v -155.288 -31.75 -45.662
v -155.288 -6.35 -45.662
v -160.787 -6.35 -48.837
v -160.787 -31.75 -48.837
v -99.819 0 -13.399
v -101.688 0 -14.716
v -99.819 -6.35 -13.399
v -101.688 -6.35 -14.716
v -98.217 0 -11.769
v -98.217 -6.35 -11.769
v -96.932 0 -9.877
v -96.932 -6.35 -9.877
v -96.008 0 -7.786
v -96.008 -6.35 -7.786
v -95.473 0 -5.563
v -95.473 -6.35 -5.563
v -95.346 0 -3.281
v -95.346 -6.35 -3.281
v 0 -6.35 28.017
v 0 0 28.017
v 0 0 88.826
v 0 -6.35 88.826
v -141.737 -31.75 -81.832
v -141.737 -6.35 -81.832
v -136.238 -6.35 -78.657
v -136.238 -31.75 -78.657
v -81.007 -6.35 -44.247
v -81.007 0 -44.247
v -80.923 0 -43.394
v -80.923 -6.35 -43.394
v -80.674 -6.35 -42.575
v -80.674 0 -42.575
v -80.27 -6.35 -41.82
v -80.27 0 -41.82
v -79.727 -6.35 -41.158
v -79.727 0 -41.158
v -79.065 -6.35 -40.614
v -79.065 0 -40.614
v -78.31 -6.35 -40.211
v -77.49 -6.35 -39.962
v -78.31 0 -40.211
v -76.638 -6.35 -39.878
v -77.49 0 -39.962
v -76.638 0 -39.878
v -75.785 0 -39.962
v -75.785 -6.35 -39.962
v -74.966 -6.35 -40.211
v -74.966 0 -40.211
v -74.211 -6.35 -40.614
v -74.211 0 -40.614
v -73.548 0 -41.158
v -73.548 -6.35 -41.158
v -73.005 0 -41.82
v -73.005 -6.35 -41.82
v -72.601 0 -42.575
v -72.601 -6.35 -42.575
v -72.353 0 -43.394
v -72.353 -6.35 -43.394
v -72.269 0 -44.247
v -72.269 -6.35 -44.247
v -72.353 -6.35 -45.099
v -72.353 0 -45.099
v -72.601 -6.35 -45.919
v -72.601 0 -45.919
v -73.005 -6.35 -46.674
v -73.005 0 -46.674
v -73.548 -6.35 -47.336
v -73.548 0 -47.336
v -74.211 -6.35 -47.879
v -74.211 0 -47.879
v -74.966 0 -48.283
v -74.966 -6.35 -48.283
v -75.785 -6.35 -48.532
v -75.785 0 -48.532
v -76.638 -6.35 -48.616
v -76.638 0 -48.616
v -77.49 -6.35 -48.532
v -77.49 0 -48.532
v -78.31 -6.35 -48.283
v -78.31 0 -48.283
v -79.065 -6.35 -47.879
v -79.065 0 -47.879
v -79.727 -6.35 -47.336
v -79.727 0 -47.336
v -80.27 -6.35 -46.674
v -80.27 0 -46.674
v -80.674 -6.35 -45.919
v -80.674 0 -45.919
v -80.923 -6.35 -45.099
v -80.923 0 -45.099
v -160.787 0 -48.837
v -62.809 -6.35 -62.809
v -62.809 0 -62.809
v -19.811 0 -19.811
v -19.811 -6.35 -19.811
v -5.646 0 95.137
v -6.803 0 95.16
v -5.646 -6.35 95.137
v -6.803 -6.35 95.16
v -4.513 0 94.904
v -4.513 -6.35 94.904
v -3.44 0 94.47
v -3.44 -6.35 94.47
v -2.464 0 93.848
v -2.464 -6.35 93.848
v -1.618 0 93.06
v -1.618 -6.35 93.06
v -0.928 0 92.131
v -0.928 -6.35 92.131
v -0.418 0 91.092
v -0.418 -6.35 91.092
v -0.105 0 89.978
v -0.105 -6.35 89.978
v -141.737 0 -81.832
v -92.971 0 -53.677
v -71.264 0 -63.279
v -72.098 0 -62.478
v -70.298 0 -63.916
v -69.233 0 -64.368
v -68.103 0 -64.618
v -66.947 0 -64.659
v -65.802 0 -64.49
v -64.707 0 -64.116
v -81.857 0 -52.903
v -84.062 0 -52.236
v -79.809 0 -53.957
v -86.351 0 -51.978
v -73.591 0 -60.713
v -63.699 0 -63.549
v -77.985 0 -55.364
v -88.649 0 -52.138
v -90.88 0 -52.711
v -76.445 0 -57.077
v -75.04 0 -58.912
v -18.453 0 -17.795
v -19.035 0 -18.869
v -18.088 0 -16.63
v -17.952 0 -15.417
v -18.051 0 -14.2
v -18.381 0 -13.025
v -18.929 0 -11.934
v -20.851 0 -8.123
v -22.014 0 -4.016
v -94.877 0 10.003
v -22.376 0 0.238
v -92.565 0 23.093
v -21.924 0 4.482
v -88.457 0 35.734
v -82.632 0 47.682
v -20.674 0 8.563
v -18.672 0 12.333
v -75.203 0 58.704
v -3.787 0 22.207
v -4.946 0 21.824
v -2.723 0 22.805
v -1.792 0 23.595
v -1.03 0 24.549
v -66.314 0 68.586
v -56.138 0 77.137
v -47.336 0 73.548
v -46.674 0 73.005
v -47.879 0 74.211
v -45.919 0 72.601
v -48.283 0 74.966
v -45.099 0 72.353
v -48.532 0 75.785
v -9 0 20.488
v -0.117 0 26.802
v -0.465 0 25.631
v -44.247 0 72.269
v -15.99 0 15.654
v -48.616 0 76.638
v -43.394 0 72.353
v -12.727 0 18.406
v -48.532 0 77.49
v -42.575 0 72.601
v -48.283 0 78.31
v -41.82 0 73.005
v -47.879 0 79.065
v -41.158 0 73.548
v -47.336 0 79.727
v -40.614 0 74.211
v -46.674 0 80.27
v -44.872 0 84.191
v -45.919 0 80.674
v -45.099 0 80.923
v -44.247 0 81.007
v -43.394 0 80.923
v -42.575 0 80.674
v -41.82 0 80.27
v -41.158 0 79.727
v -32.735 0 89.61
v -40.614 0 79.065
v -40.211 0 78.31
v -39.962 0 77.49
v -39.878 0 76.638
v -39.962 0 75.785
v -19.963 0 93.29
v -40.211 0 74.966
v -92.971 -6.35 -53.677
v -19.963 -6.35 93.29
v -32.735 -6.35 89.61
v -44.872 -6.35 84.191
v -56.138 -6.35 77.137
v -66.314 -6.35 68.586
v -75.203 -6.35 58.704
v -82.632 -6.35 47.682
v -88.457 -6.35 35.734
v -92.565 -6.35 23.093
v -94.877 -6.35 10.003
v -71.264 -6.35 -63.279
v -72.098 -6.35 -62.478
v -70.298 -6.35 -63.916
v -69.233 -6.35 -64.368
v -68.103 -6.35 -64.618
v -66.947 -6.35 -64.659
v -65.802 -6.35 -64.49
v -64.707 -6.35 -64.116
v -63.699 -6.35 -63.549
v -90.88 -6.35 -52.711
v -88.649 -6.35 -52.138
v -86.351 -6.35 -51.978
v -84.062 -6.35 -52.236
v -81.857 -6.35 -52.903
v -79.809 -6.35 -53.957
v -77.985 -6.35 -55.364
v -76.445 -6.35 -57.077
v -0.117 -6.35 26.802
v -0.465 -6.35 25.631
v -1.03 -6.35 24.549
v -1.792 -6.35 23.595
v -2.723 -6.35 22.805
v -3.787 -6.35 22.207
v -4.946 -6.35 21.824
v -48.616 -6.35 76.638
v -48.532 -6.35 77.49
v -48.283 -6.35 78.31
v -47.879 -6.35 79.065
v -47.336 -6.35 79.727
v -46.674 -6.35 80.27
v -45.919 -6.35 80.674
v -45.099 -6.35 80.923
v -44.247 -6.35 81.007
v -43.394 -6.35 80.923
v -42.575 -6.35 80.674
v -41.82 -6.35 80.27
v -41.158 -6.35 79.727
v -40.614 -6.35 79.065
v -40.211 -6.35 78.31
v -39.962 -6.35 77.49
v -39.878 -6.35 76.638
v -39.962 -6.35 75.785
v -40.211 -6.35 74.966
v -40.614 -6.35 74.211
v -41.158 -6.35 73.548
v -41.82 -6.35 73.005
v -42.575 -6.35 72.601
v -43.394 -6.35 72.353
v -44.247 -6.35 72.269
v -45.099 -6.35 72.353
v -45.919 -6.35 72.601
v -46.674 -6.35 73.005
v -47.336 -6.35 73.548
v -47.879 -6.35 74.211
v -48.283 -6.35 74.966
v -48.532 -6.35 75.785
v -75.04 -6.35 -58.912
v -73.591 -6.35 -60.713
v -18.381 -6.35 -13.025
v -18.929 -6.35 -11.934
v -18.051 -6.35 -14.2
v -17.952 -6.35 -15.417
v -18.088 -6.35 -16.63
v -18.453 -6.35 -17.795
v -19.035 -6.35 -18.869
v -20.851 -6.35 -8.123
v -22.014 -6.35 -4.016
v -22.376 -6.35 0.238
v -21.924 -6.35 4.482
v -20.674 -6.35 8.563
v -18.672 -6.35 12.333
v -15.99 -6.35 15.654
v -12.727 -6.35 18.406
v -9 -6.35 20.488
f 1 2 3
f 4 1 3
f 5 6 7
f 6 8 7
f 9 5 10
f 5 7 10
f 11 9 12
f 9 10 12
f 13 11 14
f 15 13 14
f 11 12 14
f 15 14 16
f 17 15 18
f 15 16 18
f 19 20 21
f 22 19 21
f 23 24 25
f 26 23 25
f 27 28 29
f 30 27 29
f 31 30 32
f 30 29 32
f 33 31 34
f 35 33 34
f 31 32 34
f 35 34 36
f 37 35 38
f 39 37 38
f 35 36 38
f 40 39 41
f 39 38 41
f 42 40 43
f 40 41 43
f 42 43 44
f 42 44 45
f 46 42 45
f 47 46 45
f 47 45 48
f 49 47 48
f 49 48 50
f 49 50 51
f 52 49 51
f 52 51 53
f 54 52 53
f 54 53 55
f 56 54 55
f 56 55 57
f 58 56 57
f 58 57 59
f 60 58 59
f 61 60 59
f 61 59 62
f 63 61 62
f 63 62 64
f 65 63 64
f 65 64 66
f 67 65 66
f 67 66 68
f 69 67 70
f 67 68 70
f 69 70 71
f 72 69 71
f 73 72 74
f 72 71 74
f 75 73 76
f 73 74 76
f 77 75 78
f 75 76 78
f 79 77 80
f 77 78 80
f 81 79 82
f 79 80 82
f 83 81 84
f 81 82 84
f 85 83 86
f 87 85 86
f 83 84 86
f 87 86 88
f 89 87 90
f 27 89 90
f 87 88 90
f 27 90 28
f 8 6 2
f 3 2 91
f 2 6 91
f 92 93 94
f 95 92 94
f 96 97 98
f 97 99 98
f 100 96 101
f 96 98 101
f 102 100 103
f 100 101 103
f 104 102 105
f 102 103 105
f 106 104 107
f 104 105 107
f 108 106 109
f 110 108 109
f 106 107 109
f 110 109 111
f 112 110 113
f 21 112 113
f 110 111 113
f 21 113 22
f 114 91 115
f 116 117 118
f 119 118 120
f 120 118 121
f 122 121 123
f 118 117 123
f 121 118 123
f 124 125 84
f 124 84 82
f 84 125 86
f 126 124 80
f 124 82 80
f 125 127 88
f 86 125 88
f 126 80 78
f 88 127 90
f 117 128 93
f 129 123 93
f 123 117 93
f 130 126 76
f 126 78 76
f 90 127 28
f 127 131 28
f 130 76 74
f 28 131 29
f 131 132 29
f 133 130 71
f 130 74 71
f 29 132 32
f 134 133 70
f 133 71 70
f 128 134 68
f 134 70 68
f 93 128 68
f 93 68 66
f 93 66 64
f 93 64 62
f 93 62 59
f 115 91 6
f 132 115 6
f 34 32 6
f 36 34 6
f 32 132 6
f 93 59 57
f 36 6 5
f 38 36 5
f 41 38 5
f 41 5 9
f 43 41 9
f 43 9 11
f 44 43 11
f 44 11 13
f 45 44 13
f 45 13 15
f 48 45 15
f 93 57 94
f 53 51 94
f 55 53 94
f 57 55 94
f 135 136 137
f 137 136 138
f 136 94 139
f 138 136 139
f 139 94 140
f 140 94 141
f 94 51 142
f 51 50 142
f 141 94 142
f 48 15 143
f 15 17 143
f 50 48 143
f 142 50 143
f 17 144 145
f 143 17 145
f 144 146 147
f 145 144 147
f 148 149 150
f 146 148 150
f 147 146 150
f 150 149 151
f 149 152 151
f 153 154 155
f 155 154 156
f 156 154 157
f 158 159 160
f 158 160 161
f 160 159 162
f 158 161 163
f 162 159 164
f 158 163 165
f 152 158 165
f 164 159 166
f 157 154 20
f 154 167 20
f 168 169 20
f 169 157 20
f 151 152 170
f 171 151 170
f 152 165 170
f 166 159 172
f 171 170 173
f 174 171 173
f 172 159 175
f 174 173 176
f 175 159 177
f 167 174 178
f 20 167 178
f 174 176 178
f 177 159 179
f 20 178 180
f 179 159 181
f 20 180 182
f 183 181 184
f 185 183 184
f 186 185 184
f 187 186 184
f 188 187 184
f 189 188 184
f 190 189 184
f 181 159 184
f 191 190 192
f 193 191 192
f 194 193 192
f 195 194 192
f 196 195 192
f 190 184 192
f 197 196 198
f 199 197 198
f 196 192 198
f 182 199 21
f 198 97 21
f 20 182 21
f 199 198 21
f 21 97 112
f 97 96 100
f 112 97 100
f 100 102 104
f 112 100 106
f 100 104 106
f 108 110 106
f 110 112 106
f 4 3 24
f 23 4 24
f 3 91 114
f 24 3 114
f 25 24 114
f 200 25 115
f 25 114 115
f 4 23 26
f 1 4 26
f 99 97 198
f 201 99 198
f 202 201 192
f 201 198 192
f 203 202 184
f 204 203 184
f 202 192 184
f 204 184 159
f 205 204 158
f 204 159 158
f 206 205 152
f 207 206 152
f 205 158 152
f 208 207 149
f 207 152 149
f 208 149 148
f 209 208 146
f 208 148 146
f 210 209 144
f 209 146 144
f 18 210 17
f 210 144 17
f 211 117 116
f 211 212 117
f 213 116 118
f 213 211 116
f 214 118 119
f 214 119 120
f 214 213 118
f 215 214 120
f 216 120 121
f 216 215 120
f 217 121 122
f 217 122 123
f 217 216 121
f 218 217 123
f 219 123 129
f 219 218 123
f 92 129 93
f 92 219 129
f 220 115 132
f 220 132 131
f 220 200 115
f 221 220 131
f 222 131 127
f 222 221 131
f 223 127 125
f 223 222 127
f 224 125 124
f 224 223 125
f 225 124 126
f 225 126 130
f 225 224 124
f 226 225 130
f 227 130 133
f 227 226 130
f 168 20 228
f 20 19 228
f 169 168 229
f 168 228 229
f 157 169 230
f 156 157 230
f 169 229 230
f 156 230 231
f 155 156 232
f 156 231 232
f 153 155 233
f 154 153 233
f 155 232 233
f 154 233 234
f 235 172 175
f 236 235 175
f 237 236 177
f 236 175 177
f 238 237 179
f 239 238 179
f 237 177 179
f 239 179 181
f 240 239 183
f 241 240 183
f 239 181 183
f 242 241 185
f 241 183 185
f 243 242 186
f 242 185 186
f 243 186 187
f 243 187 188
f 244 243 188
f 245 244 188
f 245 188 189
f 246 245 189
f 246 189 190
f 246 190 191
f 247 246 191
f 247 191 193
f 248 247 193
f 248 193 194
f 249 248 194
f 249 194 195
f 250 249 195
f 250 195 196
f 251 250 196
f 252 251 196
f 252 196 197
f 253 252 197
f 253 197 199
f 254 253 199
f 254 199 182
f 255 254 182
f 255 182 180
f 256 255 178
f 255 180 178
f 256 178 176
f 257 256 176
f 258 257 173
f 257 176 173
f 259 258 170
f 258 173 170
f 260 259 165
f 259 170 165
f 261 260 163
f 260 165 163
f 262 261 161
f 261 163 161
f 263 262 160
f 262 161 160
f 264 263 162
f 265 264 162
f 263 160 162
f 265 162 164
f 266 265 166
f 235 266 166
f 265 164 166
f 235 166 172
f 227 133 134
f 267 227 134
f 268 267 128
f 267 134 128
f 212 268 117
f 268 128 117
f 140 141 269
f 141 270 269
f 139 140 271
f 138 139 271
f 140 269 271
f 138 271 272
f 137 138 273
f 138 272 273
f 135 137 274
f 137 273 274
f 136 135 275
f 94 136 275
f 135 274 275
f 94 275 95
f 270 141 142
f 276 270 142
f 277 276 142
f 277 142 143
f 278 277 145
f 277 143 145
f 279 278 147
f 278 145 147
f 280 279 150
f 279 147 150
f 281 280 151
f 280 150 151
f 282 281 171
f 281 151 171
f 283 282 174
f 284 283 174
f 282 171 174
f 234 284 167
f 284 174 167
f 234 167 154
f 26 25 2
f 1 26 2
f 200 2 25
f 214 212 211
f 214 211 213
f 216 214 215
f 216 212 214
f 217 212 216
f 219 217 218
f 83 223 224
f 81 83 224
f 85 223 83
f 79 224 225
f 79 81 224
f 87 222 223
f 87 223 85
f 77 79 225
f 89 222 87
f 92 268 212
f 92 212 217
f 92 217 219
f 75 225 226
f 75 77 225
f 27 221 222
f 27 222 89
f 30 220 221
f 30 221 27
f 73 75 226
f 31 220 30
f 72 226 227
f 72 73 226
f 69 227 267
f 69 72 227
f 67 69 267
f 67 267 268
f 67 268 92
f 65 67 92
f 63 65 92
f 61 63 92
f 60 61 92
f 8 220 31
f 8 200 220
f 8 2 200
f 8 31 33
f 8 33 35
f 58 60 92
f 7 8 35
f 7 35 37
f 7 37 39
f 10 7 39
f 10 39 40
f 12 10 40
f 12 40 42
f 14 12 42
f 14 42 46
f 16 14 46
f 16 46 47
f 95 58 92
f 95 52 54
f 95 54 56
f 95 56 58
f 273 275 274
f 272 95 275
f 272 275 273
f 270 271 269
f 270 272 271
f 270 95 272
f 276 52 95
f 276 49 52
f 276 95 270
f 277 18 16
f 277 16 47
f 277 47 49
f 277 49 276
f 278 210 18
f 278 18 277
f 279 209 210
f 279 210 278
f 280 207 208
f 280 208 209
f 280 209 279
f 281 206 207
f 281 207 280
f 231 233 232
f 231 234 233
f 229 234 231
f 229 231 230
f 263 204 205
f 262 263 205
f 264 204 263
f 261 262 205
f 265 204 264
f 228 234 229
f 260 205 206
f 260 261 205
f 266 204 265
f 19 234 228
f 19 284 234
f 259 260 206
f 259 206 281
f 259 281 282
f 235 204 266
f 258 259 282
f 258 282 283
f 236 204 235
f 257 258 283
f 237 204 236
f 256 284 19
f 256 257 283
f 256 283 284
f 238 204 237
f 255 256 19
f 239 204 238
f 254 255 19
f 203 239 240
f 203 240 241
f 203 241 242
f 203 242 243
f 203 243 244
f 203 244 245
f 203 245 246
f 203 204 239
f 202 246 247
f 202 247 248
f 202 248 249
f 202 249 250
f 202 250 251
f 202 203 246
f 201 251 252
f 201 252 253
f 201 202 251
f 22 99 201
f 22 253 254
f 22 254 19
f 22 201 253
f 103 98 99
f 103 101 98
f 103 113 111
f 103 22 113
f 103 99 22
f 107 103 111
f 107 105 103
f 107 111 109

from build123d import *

# Parameters (mm, degrees)
F1_DEPTH = 6.35
F3_D     = 8.7376
F5_DEPTH = 25.4
F6_R     = 12.7
F7_R     = 6.35


with BuildPart() as f1:
    # F0 (on Front) → F1 (new body)
    with BuildSketch(Plane.XZ):
        with BuildLine():
            Line((-141.7374620444, -81.8321618656), (-82.620901982, -47.7012))
            ThreePointArc((-82.620901982, -47.7012), (-75.6878127118, -58.0773013549), (-67.4596839815, -67.4596839815))
            Line((-67.4596839815, -67.4596839815), (-15.8232112853, -15.8232112853))
            ThreePointArc((-15.8232112853, -15.8232112853), (-20.6740218508, 8.5634602394), (0, 22.3774))
            Line((0, 22.3774), (0, 95.4024))
            ThreePointArc((0, 95.4024), (-71.1544614181, 63.5504566943), (-94.7963262761, -10.7365939814))
            Line((-94.7963262761, -10.7365939814), (-160.7874620444, -48.8365939814))
            Line((-160.7874620444, -48.8365939814), (-141.7374620444, -81.8321618656))
        make_face()
    extrude(amount=F1_DEPTH)

    # F3 (through all)
    with Locations(Plane.XZ.offset(6.35)):
        with Locations((-44.2468, 76.6377056723), (-76.6377056723, -44.2468)):
            Hole(F3_D / 2)

    # F4 (on face) → F5 (join)
    with BuildSketch(Plane.XZ.offset(6.35)):
        Polygon((-136.2382007304, -78.6571618656), (-155.2882007304, -45.6615939814), (-160.7874620444, -48.8365939814), (-141.7374620444, -81.8321618656), align=None)
    extrude(amount=F5_DEPTH)

    # F6
    f6_edges = [f1.edges().sort_by_distance(p)[0] for p in [
        (-82.620902, -3.175, -47.7012),
        (-94.796326, -3.175, -10.736594),
    ]]
    fillet(f6_edges, radius=F6_R)

    # F7
    f7_edges = [f1.edges().sort_by_distance(p)[0] for p in [
        (-67.459684, -3.175, -67.459684),
        (-15.823211, -3.175, -15.823211),
        (0, -3.175, 22.3774),
        (0, -3.175, 95.4024),
    ]]
    fillet(f7_edges, radius=F7_R)


solid = f1.part
